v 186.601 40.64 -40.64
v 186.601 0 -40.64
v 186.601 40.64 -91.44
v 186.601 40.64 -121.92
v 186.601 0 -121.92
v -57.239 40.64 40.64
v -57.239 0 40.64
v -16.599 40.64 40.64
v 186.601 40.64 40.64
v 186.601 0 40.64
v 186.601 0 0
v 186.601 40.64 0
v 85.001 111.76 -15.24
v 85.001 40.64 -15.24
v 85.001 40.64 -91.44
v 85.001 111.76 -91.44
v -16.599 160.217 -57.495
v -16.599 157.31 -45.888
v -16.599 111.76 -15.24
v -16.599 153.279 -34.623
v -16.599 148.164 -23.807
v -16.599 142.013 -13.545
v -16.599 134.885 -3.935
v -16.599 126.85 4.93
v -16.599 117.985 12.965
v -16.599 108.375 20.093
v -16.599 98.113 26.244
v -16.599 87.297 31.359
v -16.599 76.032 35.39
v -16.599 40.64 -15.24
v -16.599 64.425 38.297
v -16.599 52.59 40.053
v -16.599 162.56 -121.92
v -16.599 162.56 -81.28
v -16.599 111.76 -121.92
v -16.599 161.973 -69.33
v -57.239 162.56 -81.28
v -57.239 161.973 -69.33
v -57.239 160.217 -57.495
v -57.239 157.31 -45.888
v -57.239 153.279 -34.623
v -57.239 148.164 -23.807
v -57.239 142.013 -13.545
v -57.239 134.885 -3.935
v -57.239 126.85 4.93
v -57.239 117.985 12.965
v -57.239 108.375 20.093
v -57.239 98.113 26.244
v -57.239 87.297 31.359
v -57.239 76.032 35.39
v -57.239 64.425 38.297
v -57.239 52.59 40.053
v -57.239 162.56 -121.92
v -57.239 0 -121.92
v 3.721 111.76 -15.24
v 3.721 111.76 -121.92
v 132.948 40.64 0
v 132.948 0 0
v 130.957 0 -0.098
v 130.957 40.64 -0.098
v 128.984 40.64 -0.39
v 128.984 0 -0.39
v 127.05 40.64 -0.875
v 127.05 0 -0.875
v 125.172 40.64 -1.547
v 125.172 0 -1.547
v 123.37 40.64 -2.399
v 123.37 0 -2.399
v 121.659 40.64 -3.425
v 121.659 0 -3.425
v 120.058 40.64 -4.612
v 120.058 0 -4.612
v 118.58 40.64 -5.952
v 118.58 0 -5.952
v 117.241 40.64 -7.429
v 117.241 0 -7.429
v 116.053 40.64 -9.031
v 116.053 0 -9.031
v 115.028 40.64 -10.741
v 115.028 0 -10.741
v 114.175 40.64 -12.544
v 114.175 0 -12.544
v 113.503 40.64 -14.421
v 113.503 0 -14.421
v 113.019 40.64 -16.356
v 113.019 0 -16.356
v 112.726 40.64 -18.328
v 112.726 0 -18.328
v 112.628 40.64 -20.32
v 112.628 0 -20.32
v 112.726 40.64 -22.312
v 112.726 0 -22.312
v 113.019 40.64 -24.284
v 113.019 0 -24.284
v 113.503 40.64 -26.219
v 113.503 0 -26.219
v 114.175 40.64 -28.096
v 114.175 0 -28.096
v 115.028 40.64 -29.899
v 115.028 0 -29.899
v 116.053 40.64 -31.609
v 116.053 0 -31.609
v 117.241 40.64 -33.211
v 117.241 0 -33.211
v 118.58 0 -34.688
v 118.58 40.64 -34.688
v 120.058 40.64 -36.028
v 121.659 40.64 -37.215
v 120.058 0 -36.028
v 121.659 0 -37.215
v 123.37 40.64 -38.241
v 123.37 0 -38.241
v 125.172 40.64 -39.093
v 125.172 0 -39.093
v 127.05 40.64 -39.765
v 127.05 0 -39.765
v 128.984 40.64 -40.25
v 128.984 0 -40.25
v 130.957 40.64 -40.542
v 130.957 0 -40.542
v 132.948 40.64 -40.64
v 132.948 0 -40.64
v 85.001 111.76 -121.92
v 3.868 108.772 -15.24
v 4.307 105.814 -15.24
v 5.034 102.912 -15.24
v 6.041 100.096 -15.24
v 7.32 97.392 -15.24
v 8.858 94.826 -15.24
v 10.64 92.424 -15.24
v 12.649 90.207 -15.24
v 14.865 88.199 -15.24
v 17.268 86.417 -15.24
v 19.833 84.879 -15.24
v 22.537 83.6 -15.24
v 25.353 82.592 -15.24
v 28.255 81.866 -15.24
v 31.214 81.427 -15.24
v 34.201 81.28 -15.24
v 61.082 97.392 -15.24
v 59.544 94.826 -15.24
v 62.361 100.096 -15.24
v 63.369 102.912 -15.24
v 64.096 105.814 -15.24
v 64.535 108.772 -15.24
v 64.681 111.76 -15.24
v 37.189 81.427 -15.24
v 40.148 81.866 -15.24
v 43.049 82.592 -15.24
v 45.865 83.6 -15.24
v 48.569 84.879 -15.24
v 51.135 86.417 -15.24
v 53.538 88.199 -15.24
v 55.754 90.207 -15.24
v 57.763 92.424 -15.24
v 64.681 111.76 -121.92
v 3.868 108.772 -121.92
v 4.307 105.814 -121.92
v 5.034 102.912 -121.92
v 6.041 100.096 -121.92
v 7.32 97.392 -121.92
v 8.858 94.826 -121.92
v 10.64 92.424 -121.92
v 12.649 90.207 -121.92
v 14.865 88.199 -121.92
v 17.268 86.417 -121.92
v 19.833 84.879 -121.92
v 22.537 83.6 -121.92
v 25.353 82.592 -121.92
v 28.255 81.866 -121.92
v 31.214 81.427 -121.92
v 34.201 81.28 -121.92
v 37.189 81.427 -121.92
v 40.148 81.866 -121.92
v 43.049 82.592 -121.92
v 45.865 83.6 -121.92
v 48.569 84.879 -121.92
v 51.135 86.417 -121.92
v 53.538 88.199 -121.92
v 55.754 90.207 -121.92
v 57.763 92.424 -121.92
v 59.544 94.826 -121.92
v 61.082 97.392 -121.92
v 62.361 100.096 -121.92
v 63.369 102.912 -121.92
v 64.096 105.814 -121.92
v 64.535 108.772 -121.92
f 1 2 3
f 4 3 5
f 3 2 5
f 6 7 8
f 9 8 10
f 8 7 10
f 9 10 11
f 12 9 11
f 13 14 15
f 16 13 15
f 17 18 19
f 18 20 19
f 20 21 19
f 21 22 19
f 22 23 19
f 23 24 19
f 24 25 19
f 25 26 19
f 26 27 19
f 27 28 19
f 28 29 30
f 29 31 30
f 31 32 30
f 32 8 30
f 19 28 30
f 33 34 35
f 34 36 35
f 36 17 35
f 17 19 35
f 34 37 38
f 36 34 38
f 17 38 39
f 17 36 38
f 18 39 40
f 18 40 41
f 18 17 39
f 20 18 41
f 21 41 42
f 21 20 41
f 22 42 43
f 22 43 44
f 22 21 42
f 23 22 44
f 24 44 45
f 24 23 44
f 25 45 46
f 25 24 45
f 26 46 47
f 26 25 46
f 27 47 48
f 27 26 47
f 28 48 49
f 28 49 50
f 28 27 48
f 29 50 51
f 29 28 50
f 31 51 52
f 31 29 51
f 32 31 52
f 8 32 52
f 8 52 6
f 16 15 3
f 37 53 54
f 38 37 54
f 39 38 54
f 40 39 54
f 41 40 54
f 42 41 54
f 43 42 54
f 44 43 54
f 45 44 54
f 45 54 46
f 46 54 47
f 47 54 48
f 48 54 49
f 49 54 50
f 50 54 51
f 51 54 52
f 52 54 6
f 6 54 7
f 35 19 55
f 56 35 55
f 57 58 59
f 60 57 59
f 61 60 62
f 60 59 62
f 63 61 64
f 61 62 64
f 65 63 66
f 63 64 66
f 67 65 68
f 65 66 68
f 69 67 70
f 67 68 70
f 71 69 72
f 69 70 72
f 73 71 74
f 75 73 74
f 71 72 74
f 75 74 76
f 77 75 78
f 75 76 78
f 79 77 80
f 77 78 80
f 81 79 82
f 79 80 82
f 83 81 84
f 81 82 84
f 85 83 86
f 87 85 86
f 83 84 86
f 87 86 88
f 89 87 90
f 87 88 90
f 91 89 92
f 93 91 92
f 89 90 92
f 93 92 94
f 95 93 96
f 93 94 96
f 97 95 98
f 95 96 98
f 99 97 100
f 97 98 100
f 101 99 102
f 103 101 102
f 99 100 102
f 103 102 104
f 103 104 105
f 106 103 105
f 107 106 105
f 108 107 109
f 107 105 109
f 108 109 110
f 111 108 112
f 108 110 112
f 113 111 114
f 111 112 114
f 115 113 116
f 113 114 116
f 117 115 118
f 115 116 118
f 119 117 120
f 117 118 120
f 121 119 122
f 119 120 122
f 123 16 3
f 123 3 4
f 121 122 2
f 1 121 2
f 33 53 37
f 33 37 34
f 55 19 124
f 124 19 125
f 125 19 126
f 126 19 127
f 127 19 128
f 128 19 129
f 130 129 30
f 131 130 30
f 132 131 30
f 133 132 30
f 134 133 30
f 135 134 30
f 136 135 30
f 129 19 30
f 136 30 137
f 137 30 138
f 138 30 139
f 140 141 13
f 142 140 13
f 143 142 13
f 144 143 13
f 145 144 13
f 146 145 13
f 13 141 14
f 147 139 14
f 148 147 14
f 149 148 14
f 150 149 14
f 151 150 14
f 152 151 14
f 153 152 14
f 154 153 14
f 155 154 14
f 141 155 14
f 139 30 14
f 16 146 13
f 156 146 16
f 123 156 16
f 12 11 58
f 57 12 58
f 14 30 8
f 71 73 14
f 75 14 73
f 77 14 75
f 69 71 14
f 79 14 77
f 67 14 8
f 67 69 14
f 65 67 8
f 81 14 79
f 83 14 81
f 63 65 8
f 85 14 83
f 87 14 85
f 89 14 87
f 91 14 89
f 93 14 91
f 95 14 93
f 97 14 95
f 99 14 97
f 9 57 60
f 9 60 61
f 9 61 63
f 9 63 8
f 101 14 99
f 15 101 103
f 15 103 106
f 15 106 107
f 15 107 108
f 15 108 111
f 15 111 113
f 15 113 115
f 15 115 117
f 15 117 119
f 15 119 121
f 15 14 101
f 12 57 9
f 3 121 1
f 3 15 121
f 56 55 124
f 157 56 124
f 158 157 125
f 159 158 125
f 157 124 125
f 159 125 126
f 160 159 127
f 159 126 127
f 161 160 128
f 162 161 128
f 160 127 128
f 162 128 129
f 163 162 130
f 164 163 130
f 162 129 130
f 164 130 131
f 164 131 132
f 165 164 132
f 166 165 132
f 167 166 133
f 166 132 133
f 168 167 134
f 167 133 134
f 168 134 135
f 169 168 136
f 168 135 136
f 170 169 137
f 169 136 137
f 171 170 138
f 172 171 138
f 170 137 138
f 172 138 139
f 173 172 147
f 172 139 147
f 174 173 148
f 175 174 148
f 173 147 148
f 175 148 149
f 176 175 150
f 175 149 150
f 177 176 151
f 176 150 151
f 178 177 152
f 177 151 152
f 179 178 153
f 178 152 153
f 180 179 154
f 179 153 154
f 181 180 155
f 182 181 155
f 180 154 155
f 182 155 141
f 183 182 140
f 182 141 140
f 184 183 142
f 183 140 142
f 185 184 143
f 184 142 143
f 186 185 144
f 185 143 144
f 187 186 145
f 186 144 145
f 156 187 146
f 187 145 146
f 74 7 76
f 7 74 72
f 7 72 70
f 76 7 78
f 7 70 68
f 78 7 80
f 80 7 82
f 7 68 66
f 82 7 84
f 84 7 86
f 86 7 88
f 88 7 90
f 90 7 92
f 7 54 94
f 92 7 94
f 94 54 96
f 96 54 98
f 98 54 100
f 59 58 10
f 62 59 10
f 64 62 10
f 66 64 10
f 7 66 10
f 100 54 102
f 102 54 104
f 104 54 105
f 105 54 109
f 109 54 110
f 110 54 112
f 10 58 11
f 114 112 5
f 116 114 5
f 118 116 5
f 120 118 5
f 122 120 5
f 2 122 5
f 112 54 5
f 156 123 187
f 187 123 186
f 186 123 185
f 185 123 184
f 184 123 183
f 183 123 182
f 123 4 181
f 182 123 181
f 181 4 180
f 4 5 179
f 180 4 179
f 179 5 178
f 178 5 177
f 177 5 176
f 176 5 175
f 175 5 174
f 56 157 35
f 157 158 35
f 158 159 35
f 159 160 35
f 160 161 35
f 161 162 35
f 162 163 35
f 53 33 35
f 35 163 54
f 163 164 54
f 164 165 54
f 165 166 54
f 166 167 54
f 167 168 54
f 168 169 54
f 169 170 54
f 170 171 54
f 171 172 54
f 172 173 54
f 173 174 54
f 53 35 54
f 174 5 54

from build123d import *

# Parameters (mm, degrees)
BOSS_EXTRUDE1_DEPTH = 40.64
BOSS_EXTRUDE2_DEPTH = 121.92
BOSS_EXTRUDE3_DEPTH = 71.12
CHAMFER1_SIZE       = 71.12
CHAMFER1_SIZE2      = 101.6
FILLET1_R           = 121.92
CUT_EXTRUDE1_DEPTH  = 106.68


with BuildPart() as part:
    # Sketch1 → Boss-Extrude1 (new body)
    with BuildSketch(Plane(origin=(0, 0, 0), x_dir=(1, 0, 0), z_dir=(0, 1, 0))):
        with BuildLine():
            Line((186.601289805, 121.92), (-57.238710195, 121.92))
            Line((-57.238710195, 121.92), (-57.238710195, -40.64))
            Line((-57.238710195, -40.64), (186.601289805, -40.64))
            Line((186.601289805, -40.64), (186.601289805, 0))
            Line((186.601289805, 0), (132.948481924, 0))
            ThreePointArc((132.948481924, 0), (112.628481924, 20.32), (132.948481924, 40.64))
            Line((132.948481924, 40.64), (186.601289805, 40.64))
            Line((186.601289805, 40.64), (186.601289805, 121.92))
        make_face()
    extrude(amount=BOSS_EXTRUDE1_DEPTH)

    # Sketch2 → Boss-Extrude2 (add)
    with BuildSketch(Plane(origin=(0, 40.64, 0), x_dir=(1, 0, 0), z_dir=(0, 1, 0))):
        Polygon((-16.598710195, 15.24), (-16.598710195, 121.92), (-57.238710195, 121.92), (-57.238710195, -40.64), (-16.598710195, -40.64), align=None)
    extrude(amount=BOSS_EXTRUDE2_DEPTH)

    # Sketch2<4> → Boss-Extrude3 (add)
    with BuildSketch(Plane(origin=(0, 40.64, 0), x_dir=(1, 0, 0), z_dir=(0, 1, 0))):
        Polygon((-16.598710195, 15.24), (85.001289805, 15.24), (85.001289805, 91.44), (186.601289805, 91.44), (186.601289805, 121.92), (-16.598710195, 121.92), align=None)
    extrude(amount=BOSS_EXTRUDE3_DEPTH)

    # Chamfer1
    chamfer1_edges = [part.edges().sort_by_distance(p)[0] for p in [
        (186.601289805, 111.76, -106.68),
    ]]
    chamfer1_side = [part.faces().sort_by_distance(p)[0] for p in [
        (186.601289805, 20.32, -42.021909404),
    ]]
    chamfer(chamfer1_edges, length=CHAMFER1_SIZE, length2=CHAMFER1_SIZE2, reference=chamfer1_side[0])

    # Fillet1
    fillet1_edges = [part.edges().sort_by_distance(p)[0] for p in [
        (-36.918710195, 162.56, 40.64),
    ]]
    fillet(fillet1_edges, radius=FILLET1_R)

    # Sketch3 → Cut-Extrude1 (cut)
    with BuildSketch(Plane.XY.offset(-15.24)):
        with BuildLine():
            Line((64.681289805, 111.76), (3.721289805, 111.76))
            ThreePointArc((3.721289805, 111.76), (34.201289805, 81.28), (64.681289805, 111.76))
        make_face()
    extrude(amount=-CUT_EXTRUDE1_DEPTH, mode=Mode.SUBTRACT)


solid = part.part
